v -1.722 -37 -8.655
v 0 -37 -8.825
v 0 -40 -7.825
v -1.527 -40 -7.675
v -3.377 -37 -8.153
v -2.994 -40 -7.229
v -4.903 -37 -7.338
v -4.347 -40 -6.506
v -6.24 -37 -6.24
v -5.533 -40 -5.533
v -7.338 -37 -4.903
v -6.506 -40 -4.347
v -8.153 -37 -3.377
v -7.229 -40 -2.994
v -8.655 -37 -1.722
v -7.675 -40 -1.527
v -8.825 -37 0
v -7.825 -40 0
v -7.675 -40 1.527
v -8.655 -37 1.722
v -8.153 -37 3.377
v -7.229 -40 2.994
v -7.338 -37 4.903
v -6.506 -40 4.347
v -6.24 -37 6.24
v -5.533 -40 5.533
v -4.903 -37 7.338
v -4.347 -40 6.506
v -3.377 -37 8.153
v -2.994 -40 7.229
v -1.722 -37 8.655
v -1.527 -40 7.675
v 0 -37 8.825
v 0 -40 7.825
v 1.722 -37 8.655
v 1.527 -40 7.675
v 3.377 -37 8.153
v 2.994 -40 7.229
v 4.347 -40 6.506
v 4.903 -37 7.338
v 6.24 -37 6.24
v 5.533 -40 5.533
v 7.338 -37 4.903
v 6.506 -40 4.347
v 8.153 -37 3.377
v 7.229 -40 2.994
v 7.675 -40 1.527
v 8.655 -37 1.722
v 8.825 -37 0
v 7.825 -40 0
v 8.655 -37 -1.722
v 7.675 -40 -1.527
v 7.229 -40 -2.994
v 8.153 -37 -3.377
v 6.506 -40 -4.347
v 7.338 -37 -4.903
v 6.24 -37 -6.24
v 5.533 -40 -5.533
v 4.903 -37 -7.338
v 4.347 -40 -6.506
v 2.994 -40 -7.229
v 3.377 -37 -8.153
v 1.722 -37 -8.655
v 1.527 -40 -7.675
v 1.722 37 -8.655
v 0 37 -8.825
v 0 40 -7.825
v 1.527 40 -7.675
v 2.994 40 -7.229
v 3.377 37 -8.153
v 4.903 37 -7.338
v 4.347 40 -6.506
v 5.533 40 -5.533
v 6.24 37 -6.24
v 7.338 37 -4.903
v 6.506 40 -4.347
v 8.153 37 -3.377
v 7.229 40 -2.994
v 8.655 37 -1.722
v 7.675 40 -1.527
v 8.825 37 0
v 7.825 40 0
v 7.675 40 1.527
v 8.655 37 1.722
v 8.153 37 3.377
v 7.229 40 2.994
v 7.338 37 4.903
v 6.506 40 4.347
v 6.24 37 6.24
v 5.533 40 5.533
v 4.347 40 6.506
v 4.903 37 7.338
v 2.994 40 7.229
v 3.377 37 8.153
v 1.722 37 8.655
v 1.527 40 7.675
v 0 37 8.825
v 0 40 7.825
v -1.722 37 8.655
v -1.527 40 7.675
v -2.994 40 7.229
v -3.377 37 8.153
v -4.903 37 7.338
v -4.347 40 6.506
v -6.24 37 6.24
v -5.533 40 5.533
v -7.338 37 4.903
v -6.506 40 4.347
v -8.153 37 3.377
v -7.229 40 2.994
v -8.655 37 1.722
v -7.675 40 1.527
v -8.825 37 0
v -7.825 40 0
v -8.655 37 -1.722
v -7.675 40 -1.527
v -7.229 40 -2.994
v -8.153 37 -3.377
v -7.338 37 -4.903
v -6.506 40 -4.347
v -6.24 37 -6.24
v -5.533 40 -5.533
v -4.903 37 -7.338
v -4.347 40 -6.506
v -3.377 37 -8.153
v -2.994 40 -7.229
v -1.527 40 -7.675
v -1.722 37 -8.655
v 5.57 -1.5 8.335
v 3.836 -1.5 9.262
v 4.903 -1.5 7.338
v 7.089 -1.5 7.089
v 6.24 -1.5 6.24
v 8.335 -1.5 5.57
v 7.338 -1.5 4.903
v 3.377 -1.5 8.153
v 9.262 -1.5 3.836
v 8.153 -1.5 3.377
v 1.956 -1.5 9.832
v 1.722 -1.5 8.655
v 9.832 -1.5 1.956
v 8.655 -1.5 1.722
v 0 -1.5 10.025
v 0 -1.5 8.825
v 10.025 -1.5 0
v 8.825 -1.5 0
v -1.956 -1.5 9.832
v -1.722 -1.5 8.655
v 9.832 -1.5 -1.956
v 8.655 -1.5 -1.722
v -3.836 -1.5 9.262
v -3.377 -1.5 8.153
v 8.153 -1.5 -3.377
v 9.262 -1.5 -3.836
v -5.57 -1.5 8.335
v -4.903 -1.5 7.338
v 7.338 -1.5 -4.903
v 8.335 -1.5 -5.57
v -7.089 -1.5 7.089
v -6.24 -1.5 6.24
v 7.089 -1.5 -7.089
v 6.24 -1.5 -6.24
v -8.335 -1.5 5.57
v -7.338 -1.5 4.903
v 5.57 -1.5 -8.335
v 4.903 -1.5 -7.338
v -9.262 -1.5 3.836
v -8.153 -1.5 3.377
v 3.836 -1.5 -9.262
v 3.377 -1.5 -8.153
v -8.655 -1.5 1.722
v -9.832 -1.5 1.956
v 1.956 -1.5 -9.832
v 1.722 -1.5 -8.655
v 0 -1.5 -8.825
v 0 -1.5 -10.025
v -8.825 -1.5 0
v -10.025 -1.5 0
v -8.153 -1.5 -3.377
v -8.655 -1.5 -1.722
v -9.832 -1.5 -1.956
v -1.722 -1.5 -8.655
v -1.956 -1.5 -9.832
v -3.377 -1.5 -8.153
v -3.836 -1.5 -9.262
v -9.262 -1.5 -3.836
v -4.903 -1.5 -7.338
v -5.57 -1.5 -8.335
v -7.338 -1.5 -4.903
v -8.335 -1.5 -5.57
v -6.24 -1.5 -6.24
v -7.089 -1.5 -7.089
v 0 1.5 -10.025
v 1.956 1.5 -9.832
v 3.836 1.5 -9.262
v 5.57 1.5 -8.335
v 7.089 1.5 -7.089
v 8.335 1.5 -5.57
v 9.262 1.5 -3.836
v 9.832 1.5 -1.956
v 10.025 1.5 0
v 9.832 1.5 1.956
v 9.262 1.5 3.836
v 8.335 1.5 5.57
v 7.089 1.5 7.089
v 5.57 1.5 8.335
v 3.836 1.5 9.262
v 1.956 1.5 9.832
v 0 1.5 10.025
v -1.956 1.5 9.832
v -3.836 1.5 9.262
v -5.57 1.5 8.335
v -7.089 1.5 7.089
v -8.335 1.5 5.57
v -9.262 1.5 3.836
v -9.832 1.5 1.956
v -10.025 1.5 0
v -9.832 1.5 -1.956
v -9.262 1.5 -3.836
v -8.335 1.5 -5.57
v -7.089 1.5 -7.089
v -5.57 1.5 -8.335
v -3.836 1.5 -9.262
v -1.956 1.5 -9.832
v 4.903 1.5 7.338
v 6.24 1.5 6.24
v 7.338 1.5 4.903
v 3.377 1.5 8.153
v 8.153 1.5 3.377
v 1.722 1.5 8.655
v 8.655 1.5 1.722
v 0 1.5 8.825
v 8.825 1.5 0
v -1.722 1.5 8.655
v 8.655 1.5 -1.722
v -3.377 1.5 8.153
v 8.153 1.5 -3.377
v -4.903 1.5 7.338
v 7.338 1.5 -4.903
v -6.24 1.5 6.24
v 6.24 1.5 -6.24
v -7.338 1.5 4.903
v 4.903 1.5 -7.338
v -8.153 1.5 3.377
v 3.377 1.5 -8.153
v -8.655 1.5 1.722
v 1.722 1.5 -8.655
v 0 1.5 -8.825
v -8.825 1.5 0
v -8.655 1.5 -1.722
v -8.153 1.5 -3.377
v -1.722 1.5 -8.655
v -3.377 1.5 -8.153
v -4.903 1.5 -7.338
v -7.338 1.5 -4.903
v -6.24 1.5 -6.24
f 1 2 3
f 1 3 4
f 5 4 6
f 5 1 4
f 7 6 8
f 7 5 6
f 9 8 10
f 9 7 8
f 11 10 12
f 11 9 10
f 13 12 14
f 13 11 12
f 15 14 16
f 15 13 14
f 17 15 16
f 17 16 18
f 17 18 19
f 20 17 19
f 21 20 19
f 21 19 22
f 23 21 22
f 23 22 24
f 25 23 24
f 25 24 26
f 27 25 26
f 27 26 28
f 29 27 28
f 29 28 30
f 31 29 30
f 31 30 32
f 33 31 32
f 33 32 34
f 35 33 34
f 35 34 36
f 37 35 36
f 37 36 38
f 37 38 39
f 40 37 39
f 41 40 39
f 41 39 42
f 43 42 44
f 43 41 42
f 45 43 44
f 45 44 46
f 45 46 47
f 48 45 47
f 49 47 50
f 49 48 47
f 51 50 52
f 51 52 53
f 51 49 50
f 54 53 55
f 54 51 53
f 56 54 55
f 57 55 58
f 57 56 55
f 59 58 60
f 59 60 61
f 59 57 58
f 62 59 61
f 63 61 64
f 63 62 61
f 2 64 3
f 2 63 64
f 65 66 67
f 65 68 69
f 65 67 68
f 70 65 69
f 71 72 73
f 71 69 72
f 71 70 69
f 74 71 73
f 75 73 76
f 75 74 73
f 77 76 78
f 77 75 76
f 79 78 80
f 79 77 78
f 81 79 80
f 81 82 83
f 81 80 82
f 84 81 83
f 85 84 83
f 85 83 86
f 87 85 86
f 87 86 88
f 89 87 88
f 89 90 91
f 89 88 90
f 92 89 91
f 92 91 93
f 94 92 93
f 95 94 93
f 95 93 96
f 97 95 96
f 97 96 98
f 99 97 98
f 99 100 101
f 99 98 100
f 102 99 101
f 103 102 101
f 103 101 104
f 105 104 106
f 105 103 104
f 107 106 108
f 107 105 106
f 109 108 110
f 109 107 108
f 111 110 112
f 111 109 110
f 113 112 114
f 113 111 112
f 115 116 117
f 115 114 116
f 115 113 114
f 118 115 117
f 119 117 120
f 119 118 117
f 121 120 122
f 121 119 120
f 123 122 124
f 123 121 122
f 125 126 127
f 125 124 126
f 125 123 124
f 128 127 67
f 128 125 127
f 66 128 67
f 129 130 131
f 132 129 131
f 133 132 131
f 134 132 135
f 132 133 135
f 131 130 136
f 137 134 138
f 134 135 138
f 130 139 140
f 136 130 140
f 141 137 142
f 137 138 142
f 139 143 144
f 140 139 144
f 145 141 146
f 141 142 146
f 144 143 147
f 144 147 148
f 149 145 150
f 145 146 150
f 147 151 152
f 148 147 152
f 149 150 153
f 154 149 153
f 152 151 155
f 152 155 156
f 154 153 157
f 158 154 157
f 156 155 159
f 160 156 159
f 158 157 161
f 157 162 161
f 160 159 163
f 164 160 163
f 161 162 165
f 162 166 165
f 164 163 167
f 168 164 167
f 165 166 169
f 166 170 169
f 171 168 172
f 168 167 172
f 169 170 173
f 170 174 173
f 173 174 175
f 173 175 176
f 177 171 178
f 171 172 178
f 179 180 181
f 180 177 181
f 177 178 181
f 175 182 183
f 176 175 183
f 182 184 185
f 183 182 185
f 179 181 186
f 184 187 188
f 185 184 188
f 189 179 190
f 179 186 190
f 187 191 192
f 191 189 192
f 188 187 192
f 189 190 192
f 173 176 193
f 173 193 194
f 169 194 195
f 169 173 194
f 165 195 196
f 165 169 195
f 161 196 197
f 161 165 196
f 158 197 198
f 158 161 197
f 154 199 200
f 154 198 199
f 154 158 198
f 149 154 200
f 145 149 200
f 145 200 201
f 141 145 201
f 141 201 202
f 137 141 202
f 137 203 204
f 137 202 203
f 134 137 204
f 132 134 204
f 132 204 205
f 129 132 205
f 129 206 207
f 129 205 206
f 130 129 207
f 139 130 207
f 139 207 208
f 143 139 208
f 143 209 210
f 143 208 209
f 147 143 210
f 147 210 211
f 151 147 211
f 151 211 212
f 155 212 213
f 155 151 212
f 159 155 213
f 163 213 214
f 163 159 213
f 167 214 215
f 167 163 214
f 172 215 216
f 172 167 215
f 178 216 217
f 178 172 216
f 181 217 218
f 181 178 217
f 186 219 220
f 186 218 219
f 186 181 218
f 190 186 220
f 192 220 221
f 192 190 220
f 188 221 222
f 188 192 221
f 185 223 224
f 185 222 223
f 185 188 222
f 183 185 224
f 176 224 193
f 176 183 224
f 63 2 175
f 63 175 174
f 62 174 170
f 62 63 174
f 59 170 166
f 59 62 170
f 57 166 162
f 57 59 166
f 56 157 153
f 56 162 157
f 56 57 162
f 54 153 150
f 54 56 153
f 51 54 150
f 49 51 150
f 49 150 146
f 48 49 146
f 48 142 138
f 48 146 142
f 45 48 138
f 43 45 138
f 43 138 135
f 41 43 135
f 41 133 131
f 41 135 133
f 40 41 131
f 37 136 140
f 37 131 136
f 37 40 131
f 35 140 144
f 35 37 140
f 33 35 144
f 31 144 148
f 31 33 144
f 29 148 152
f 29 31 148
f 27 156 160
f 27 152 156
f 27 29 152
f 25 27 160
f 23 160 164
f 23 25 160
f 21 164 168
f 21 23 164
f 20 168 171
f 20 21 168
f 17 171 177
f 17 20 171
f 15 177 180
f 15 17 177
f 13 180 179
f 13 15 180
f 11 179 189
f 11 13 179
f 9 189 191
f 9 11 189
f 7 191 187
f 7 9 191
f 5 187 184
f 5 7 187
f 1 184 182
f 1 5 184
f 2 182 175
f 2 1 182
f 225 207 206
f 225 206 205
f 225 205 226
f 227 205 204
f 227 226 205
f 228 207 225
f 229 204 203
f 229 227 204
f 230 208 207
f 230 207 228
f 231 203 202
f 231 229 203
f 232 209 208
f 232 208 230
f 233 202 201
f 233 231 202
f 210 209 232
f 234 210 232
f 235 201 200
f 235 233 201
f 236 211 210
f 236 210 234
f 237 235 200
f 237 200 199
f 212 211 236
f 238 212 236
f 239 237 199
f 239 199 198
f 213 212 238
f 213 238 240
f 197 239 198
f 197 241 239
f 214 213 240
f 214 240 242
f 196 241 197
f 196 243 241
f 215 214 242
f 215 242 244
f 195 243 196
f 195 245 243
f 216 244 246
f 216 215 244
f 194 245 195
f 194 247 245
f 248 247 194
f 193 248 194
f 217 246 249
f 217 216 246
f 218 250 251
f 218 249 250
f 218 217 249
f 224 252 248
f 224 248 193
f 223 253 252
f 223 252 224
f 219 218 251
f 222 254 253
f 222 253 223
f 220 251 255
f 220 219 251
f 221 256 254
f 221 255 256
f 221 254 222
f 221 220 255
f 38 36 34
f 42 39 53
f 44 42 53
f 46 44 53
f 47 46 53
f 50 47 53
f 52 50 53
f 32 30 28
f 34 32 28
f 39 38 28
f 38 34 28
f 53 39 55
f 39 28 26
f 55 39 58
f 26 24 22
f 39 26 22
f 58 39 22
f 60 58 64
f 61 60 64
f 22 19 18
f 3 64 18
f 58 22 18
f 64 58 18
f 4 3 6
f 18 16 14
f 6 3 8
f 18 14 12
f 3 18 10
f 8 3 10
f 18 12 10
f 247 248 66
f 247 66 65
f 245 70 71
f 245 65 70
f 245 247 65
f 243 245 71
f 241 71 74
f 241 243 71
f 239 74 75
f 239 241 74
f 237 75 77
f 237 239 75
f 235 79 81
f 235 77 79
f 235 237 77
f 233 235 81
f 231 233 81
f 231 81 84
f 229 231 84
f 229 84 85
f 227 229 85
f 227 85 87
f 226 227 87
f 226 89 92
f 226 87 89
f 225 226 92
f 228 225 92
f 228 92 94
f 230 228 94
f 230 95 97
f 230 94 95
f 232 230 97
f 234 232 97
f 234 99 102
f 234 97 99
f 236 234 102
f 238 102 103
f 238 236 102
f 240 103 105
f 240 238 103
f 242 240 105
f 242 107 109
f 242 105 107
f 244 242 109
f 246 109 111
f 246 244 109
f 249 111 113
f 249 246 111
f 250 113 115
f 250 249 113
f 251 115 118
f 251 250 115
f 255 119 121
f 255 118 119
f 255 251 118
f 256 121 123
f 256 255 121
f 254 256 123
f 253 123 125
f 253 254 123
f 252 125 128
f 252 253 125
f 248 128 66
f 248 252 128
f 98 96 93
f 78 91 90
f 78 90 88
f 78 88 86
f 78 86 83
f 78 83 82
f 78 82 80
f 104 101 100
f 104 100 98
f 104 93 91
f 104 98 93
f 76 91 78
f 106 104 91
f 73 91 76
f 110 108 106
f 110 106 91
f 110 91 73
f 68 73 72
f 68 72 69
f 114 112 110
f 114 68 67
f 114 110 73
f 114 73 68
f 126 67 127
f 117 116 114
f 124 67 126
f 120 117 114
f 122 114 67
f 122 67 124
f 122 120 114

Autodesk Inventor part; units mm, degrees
ref_plane "YZ Plane" through (0, 0, 0) normal (1, 0, 0) x (0, 1, 0)
ref_plane "XZ Plane" through (0, 0, 0) normal (0, 1, 0) x (-1, 0, 0)
ref_plane "XY Plane" through (0, 0, 0) normal (0, 0, 1) x (1, 0, 0)
sketch "Sketch2" plane through (0, 0, 0) normal (1, 0, 0) x (0, 1, 0)
  line L0 (0, 0) -> (59.3152, 0)
  line L1 (-40, 0) -> (40, 0)
  line L2 (40, 0) -> (40, -8.825)
  line L3 (40, -8.825) -> (-40, -8.825)
  line L4 (-40, -8.825) -> (-40, 0)
  line L5 (-1.5, -8.825) -> (1.5, -8.825)
  line L6 (1.5, -8.825) -> (1.5, -10.025)
  line L7 (1.5, -10.025) -> (-1.5, -10.025)
  line L8 (-1.5, -10.025) -> (-1.5, -8.825)
  point P0 (0, -10.025)
  point P1 (0, -8.825)
  dimension "d2" = 8.825
  dimension "d3" = 40
  dimension "d4" = 40
  dimension "d5" = 3
  dimension "d6" = 10.025
revolve "Revolution1" add sketch "Sketch2" angle 360 about axis through (0, 0, 0) along (0, 1, 0)
chamfer "Chamfer1" distance 1 distance2 3 1 edges at (0, 40, 8.825) measured on face at (2.071, 40, -2.6902)
chamfer "Chamfer2" distance 3 distance2 1 1 edges at (0, -40, 8.825) measured on face at (1.4156, -27.1667, -8.7107)
properties part number "stange_verbinder"
